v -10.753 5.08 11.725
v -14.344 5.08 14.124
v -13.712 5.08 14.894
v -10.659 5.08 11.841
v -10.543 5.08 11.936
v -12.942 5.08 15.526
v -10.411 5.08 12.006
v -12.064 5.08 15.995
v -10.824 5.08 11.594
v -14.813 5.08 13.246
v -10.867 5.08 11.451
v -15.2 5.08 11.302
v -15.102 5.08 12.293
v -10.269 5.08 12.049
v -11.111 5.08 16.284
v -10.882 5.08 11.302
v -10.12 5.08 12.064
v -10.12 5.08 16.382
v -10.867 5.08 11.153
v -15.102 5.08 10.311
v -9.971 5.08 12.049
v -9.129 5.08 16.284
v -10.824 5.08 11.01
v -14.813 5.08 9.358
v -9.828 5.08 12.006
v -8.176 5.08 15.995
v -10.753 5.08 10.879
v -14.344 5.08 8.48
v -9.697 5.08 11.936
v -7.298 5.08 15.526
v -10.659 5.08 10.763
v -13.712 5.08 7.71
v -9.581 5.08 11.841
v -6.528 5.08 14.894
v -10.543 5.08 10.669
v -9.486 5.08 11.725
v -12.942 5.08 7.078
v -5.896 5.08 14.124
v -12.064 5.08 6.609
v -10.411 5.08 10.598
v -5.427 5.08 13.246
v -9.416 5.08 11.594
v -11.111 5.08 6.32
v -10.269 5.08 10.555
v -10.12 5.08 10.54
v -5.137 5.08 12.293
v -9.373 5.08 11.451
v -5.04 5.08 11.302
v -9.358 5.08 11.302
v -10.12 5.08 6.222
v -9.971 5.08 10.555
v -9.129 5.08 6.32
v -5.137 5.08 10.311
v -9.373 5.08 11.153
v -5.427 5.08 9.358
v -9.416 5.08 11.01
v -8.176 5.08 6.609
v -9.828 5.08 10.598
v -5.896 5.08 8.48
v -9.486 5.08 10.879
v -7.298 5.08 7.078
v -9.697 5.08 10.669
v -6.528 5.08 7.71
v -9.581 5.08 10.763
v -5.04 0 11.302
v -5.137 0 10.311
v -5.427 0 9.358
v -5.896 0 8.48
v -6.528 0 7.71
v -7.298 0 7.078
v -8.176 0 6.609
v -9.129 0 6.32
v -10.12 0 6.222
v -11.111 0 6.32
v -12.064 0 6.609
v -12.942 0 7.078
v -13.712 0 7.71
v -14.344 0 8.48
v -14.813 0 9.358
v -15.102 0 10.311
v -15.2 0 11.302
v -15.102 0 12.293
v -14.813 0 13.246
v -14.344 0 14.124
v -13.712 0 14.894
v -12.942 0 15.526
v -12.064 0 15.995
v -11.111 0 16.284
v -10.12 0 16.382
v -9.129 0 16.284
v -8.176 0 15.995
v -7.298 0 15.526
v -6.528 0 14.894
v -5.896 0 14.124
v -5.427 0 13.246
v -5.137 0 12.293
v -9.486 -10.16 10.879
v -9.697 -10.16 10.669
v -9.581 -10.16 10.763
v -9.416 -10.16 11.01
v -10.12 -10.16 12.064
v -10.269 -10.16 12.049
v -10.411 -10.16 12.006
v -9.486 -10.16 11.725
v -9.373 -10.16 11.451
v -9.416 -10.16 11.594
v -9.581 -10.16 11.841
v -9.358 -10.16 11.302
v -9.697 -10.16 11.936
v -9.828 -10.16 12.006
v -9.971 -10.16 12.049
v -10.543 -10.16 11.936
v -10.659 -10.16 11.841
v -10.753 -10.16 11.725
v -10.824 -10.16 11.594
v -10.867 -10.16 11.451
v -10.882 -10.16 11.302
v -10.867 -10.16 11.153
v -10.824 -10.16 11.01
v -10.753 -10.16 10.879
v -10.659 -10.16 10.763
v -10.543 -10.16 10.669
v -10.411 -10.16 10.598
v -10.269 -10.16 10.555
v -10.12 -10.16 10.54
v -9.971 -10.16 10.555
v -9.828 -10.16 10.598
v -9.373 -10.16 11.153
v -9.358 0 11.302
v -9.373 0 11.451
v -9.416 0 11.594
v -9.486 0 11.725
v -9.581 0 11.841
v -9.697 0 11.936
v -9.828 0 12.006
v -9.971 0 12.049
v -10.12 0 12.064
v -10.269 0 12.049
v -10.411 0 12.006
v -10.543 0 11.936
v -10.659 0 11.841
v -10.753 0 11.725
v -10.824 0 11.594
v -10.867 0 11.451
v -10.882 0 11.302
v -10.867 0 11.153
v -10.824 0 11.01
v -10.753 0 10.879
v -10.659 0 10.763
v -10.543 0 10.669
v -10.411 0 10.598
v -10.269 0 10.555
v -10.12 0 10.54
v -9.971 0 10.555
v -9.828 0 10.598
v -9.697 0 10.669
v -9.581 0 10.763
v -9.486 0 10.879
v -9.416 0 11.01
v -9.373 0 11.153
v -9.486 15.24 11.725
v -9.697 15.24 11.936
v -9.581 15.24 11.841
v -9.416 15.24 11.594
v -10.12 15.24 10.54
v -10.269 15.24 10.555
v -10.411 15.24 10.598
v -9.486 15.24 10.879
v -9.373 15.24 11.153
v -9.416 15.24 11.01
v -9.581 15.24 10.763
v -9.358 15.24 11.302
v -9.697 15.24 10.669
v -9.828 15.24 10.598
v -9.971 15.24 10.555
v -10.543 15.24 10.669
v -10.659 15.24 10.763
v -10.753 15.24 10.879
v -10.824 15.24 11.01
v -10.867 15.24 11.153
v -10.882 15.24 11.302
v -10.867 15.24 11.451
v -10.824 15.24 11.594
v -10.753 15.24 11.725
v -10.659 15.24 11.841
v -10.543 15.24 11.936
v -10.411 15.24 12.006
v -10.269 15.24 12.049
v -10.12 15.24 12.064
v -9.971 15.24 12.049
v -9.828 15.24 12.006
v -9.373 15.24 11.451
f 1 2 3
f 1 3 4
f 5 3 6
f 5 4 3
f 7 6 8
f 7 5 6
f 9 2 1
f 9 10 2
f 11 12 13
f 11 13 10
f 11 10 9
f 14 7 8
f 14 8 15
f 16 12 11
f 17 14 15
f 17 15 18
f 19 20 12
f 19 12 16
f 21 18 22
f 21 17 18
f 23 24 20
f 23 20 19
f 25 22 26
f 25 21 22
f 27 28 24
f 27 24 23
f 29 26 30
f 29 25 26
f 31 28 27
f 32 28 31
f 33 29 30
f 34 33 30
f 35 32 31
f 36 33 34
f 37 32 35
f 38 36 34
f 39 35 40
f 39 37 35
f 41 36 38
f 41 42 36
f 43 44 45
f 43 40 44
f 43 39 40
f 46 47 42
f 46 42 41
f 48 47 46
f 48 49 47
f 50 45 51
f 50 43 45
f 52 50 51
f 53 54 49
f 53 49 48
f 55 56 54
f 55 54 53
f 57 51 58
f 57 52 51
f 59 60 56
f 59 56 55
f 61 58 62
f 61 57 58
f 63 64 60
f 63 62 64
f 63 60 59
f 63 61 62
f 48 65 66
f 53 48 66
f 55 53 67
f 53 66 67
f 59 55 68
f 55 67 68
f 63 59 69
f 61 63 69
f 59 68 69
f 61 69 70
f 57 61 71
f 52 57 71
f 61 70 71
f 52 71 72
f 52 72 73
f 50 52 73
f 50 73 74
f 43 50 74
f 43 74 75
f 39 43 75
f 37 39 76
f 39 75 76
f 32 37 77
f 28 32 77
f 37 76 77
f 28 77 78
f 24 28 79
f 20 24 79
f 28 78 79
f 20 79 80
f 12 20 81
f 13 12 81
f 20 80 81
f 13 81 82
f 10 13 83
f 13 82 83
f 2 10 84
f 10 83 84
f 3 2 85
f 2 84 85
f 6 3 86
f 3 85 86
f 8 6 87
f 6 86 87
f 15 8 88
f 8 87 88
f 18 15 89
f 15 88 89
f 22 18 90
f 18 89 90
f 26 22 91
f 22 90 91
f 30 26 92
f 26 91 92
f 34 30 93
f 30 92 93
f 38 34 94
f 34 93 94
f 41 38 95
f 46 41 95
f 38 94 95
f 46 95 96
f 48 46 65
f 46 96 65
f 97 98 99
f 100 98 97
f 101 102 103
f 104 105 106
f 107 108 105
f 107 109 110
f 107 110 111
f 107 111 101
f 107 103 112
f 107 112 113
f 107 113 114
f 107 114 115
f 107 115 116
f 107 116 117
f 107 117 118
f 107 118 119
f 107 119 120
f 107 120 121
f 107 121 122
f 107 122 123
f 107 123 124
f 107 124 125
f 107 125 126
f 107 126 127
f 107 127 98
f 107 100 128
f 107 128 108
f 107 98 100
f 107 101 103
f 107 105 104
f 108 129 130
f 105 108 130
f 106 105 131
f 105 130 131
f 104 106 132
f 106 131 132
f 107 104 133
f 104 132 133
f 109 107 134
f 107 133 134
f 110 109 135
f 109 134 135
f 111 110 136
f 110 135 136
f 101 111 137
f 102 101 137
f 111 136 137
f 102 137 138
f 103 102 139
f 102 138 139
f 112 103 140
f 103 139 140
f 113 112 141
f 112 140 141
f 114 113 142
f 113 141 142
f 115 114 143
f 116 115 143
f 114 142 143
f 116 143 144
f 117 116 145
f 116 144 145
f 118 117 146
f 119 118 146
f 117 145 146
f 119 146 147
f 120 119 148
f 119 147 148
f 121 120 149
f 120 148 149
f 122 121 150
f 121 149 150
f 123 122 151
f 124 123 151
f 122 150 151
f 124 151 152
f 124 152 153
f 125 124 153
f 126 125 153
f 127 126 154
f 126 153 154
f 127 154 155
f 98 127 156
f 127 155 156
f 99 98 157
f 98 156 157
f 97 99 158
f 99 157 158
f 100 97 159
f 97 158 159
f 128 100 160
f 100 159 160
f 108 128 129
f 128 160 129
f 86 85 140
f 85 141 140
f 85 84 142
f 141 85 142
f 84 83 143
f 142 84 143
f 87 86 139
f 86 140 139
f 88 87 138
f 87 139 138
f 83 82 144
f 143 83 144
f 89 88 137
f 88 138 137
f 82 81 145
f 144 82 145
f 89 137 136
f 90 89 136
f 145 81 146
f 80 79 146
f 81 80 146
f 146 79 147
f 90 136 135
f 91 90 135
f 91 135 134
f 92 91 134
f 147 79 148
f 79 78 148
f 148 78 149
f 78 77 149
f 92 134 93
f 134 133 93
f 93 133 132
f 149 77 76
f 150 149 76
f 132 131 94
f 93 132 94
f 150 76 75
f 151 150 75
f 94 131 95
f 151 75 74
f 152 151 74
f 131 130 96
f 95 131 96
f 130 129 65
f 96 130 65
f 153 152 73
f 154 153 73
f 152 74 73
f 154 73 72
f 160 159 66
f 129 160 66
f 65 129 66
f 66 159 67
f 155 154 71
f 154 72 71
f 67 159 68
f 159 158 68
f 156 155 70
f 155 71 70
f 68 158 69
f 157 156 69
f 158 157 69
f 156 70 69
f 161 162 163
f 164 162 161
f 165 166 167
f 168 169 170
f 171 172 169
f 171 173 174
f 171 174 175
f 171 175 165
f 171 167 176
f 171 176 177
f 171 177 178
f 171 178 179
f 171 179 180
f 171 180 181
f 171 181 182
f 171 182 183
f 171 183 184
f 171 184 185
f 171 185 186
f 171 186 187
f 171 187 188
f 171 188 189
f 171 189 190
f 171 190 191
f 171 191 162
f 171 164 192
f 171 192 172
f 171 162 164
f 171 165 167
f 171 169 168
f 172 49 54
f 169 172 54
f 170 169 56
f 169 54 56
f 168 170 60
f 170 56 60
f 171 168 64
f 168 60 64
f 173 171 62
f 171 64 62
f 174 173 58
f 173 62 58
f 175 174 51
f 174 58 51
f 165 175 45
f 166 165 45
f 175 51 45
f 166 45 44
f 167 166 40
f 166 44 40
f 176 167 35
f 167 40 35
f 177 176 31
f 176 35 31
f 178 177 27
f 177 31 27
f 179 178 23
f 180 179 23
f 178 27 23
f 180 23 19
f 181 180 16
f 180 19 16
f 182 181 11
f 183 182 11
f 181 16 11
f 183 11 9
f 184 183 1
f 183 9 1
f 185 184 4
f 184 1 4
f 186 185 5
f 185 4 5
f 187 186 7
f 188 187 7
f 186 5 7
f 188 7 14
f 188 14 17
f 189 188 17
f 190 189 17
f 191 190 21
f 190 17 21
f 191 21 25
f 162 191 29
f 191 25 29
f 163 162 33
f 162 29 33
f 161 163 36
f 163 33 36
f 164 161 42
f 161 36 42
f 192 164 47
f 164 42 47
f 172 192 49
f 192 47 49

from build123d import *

# Parameters (mm, degrees)
SKETCH1_R           = 5.08
BOSS_EXTRUDE2_DEPTH = 5.08
SKETCH2_R           = 0.762
BOSS_EXTRUDE3_DEPTH = 10.16
SKETCH3_R           = 0.762
BOSS_EXTRUDE4_DEPTH = 10.16


with BuildPart() as part:
    # Sketch1 → Boss-Extrude2 (new body)
    with BuildSketch(Plane(origin=(0, 0, 0), x_dir=(1, 0, 0), z_dir=(0, 1, 0))):
        with Locations((-10.119861789, -11.302088634)):
            Circle(SKETCH1_R)
    extrude(amount=BOSS_EXTRUDE2_DEPTH)

    # Sketch2 → Boss-Extrude3 (add)
    with BuildSketch(Plane(origin=(0, 5.08, 0), x_dir=(1, 0, 0), z_dir=(0, 1, 0))):
        with Locations((-10.119861789, -11.302088634)):
            Circle(SKETCH2_R)
    extrude(amount=BOSS_EXTRUDE3_DEPTH)

    # Sketch3 → Boss-Extrude4 (add)
    with BuildSketch(Plane.XZ):
        with Locations((-10.119861789, 11.302088634)):
            Circle(SKETCH3_R)
    extrude(amount=BOSS_EXTRUDE4_DEPTH)


solid = part.part
